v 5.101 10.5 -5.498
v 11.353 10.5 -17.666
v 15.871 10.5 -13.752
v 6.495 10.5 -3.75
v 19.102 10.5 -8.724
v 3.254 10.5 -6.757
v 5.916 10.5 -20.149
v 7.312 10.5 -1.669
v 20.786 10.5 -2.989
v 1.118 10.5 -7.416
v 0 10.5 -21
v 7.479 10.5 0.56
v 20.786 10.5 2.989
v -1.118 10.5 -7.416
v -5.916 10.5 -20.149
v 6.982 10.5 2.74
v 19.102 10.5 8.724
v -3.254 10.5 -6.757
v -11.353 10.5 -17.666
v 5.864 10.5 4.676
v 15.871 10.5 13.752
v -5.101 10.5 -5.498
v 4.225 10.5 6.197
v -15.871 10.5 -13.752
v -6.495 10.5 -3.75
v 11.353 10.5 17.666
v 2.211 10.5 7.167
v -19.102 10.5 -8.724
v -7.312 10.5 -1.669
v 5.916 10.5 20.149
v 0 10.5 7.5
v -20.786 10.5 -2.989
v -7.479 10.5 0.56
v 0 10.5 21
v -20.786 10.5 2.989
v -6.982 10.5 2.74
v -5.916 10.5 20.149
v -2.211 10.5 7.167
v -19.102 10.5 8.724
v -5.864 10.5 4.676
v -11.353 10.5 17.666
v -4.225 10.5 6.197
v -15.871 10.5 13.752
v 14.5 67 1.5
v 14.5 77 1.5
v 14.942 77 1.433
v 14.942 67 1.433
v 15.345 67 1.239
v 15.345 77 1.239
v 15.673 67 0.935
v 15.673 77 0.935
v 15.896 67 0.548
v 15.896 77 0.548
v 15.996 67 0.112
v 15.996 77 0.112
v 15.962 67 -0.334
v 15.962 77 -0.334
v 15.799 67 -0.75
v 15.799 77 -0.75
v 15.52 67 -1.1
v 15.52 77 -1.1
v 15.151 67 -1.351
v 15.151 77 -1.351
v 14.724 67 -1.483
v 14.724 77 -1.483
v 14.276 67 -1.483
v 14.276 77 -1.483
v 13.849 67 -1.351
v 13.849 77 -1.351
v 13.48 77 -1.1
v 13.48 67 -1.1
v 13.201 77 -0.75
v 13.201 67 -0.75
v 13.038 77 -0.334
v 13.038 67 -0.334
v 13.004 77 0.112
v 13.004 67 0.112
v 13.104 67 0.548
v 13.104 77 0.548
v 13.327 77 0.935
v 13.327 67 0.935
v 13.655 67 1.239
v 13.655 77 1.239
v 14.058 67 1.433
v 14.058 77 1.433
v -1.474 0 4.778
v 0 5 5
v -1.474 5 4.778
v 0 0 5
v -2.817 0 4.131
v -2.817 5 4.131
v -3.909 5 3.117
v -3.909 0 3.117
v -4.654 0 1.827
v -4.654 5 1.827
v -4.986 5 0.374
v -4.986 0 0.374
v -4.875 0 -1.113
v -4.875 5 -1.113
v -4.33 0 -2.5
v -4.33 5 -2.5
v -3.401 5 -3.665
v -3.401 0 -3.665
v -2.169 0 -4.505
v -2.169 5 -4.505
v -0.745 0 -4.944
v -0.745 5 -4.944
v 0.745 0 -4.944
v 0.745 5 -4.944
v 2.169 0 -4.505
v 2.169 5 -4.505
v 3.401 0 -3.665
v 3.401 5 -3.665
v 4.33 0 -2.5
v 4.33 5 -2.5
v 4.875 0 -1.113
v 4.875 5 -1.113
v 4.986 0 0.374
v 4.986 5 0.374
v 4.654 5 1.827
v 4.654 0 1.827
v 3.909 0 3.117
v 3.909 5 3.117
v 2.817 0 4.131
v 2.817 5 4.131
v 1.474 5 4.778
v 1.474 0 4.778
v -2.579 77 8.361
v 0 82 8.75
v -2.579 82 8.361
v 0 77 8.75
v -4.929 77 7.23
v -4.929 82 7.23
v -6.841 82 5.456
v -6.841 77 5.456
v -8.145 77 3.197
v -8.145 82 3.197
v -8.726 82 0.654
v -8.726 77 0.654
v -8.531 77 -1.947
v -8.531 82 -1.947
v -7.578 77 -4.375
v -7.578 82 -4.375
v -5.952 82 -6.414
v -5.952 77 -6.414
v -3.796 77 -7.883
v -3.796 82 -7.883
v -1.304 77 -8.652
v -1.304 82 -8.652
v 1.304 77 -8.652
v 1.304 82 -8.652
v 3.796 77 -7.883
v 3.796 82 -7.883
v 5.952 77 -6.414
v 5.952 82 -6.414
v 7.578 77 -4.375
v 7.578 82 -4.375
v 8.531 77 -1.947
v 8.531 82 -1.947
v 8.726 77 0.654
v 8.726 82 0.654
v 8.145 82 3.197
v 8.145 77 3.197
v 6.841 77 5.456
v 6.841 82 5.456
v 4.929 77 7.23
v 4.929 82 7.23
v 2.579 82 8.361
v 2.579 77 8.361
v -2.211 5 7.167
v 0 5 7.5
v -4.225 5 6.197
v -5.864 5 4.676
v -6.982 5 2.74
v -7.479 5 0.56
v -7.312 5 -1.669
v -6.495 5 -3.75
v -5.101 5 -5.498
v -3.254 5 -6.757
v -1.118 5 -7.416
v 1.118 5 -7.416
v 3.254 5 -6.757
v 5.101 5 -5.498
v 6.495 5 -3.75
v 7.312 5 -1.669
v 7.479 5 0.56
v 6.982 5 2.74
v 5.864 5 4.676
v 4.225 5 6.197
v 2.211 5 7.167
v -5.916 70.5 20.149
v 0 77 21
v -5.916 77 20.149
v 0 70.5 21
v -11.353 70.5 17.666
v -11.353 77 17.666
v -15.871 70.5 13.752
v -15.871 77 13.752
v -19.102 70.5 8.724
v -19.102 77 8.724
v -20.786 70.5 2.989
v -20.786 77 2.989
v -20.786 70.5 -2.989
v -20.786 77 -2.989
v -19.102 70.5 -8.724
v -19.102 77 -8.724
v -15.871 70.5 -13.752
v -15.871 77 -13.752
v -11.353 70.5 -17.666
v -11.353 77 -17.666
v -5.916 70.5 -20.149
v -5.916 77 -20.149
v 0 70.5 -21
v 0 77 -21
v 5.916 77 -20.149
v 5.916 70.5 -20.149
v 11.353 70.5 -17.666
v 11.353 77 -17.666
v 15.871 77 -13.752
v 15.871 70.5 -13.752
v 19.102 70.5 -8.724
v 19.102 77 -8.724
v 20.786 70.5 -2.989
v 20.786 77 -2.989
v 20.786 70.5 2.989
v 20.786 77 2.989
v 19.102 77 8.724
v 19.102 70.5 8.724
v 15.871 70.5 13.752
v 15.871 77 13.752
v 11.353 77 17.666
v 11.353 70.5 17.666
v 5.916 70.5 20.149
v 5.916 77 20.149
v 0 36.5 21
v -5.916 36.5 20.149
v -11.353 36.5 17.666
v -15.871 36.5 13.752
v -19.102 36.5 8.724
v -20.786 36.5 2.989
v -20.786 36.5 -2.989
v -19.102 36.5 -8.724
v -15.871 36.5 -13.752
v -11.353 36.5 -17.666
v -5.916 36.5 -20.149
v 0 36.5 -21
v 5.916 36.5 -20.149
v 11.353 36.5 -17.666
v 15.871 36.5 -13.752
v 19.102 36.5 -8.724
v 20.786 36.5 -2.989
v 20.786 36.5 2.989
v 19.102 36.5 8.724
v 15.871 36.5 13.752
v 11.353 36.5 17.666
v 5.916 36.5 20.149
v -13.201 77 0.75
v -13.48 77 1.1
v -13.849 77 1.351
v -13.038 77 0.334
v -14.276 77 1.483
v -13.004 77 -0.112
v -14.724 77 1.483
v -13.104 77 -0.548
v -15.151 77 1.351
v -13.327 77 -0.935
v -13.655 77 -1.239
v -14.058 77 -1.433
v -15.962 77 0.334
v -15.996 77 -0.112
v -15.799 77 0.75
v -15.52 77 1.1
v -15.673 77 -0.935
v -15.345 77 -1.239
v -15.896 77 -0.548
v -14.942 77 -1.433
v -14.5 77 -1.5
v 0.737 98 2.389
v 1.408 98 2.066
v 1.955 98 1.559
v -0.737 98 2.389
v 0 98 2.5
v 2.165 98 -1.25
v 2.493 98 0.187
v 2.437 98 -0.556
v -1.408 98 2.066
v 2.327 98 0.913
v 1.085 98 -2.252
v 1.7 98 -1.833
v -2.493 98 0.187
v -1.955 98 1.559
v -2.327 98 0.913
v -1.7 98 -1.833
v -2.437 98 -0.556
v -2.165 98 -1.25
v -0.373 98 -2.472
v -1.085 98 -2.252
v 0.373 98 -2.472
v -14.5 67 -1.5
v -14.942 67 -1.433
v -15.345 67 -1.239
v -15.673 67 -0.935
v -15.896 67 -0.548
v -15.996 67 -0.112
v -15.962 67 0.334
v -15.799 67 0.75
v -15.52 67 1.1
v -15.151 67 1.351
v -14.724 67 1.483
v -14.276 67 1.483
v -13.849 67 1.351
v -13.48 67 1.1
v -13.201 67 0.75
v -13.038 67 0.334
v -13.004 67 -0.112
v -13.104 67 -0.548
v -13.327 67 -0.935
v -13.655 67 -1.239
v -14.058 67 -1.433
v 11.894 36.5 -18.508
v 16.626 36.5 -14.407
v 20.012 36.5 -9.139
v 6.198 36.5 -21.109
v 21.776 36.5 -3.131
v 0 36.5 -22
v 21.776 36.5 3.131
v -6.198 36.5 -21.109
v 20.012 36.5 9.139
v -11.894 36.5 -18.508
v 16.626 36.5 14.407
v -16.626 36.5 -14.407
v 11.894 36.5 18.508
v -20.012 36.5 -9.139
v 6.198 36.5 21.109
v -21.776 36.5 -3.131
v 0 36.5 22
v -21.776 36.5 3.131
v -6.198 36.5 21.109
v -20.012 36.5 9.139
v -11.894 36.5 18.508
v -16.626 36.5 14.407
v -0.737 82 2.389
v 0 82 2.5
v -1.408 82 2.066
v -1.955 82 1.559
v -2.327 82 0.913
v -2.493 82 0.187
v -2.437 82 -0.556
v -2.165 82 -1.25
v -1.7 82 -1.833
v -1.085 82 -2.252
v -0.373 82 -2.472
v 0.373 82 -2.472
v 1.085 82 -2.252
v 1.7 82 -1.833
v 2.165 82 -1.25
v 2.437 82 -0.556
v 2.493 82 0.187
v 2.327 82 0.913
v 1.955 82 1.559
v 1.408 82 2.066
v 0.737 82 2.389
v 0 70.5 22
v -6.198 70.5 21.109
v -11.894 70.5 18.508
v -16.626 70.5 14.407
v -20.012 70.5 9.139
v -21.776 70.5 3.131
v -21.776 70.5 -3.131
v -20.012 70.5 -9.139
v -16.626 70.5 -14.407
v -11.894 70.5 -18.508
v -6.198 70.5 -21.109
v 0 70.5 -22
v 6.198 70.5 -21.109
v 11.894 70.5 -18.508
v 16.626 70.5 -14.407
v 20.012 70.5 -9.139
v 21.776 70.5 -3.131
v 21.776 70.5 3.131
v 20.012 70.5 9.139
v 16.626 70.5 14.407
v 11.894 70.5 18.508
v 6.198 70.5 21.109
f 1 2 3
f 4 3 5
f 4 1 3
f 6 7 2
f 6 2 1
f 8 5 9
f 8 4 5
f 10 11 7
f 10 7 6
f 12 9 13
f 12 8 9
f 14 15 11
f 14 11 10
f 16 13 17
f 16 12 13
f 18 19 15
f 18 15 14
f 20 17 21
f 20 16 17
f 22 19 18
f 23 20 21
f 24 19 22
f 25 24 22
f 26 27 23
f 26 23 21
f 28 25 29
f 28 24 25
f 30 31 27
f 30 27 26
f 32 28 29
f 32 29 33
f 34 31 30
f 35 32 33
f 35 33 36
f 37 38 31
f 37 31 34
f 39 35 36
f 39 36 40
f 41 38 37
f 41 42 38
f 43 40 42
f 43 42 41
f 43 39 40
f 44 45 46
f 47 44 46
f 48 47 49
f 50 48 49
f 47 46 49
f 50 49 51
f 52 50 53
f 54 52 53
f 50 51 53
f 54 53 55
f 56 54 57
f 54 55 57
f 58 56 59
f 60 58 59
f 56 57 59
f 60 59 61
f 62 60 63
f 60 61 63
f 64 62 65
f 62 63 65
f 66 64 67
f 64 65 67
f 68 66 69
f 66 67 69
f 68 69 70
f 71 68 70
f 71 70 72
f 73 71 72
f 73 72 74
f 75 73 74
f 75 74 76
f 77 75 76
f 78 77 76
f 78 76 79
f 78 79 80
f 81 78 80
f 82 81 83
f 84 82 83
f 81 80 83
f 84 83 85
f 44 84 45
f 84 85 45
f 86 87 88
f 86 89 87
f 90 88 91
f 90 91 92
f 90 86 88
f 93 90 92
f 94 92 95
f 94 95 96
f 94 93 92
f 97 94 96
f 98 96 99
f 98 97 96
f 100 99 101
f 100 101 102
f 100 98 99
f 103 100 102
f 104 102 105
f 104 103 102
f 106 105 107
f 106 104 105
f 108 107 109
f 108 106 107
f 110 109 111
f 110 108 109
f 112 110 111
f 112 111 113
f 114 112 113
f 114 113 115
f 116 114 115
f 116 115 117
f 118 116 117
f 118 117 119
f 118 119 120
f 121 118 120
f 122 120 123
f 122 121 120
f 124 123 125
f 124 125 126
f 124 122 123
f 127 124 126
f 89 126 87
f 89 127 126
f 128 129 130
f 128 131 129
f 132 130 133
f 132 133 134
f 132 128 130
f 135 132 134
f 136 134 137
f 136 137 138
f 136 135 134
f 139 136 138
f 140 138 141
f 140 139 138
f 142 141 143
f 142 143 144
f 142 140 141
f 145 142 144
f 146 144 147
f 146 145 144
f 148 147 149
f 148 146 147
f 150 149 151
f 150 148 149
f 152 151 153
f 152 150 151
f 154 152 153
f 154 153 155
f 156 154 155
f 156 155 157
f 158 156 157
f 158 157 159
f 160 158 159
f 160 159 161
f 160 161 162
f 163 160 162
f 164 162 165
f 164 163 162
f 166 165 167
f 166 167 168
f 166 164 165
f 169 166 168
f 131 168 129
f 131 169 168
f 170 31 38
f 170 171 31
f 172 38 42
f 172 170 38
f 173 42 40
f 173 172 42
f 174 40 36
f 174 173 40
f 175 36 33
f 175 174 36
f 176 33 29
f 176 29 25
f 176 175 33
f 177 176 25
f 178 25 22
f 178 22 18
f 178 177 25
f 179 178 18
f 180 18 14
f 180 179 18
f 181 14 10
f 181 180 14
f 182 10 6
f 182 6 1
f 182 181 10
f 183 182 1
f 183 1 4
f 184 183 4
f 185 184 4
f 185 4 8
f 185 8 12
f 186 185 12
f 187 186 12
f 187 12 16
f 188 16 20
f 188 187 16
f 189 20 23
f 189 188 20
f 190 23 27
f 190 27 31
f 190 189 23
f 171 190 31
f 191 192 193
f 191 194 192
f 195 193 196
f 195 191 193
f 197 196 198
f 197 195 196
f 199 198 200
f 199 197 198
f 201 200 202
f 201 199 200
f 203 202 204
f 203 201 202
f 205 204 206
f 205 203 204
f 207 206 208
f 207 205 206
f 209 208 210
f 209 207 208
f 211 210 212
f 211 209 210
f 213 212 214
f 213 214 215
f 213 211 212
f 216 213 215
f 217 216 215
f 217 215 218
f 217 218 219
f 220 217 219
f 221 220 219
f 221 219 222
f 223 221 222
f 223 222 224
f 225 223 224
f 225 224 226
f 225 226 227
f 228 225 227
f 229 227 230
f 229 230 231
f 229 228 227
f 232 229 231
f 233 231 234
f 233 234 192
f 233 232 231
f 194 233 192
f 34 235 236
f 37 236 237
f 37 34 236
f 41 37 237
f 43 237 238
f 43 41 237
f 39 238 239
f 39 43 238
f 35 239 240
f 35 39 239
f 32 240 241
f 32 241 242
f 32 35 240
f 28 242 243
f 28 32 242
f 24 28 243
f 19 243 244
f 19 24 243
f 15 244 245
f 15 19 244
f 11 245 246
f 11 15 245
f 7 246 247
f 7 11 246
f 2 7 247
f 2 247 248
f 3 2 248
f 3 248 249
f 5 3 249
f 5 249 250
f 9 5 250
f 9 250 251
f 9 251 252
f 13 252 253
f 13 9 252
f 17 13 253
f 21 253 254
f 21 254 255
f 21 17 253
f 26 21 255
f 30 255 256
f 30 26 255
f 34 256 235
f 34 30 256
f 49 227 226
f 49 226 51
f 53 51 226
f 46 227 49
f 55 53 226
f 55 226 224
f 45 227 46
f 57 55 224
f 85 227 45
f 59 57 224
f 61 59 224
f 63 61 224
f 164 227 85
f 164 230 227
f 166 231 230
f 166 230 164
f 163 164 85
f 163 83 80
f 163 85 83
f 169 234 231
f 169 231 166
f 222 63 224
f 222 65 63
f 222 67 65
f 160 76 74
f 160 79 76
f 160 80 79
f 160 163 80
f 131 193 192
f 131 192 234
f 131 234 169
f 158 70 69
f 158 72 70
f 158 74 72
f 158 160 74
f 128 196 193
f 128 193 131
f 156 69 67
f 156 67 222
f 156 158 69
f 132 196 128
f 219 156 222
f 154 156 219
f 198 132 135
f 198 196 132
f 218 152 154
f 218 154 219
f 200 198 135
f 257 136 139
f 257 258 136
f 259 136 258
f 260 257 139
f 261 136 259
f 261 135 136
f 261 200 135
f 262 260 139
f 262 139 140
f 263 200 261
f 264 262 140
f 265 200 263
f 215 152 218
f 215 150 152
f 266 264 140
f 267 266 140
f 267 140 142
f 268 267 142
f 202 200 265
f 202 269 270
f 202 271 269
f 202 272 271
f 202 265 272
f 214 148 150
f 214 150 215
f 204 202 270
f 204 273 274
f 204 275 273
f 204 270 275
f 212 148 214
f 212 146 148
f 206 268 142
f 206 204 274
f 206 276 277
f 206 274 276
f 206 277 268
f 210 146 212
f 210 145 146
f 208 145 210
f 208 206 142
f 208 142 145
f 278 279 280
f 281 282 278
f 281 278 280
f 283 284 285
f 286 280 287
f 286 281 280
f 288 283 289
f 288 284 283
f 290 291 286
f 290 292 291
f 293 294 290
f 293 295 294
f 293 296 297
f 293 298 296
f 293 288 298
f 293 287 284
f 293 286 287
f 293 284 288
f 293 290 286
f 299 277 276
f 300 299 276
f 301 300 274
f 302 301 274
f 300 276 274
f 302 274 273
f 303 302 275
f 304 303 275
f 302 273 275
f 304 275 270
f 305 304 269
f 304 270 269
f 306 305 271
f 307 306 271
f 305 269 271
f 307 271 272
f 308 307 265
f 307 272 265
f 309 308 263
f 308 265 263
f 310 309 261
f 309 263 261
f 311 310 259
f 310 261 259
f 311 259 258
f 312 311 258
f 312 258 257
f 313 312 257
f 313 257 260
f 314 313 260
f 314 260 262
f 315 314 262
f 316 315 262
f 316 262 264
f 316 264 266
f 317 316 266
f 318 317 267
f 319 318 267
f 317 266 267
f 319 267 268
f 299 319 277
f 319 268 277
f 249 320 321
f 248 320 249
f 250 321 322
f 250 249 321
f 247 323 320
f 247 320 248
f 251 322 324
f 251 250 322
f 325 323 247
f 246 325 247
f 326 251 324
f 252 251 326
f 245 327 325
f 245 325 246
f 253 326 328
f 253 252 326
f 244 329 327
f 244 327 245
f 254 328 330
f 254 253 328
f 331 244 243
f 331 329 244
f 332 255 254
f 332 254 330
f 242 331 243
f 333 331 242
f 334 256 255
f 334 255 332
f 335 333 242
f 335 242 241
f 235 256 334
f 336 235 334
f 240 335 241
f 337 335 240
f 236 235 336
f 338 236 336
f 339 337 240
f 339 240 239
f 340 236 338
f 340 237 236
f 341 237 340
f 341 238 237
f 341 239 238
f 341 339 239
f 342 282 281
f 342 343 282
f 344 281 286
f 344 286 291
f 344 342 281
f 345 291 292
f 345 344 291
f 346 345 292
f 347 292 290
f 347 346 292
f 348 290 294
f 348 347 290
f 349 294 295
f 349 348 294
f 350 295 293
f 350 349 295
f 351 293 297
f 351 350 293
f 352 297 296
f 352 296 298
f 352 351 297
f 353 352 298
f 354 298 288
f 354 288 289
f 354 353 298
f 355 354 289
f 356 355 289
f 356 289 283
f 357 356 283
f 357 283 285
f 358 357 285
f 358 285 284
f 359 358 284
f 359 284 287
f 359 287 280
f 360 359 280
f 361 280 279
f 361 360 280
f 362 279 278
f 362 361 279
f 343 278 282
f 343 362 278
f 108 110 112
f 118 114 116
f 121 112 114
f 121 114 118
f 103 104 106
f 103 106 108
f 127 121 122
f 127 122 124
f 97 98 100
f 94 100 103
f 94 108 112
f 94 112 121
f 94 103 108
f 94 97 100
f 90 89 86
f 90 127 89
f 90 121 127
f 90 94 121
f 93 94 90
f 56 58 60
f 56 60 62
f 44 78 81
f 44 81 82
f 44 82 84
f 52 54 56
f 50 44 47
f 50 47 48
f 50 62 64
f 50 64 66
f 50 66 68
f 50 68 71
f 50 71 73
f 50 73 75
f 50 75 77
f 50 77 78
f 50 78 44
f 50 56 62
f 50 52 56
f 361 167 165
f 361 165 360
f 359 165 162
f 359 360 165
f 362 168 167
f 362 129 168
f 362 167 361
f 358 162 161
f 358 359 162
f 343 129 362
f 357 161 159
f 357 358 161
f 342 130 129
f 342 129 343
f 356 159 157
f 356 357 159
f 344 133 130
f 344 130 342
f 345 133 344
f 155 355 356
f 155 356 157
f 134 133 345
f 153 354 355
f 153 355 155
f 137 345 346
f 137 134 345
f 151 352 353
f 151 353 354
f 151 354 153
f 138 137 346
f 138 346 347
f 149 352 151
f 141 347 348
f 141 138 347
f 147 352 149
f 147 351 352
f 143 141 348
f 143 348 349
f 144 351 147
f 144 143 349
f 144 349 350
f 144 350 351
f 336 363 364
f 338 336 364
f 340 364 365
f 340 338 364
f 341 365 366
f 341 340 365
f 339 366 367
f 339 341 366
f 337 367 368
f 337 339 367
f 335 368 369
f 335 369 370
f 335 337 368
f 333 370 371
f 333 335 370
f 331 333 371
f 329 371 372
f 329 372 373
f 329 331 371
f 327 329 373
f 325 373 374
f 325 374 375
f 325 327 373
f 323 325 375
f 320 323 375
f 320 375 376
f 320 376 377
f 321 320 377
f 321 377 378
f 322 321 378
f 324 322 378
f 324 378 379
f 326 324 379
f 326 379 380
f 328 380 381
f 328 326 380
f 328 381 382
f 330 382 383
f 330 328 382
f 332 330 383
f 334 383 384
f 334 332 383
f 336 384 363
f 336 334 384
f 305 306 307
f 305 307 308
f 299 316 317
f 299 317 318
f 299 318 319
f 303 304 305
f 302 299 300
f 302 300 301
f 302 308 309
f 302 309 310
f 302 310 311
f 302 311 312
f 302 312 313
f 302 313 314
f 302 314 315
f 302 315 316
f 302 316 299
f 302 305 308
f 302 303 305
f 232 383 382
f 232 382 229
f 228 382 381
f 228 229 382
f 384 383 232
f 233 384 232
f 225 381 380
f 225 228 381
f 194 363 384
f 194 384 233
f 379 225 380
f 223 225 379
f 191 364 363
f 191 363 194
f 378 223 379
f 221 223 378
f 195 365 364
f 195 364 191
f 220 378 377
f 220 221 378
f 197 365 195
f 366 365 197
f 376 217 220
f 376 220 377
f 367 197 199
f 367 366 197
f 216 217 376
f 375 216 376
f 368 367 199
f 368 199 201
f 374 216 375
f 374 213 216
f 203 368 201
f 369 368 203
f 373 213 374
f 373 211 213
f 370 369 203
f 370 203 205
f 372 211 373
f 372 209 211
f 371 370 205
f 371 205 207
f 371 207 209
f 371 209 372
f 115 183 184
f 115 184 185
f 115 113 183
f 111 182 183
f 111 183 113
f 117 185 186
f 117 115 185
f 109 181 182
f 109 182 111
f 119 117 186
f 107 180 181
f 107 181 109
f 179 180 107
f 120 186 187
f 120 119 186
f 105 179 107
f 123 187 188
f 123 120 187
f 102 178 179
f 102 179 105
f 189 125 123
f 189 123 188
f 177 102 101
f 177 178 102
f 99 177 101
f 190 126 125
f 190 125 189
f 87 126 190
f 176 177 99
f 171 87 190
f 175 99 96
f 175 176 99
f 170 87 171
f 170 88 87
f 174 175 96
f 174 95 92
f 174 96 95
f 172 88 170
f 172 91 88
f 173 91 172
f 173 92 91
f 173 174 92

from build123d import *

# Parameters (mm, degrees)
SKETCH_2_R          = 1.5
CUT_EXTRUDE_1_DEPTH = 10


with BuildPart() as part:
    # 草图1 → 旋转1 (revolve)
    with BuildSketch(Plane.XY, mode=Mode.PRIVATE) as revolve_1_sk:
        Polygon((0, 98), (2.5, 98), (2.5, 82), (8.75, 82), (8.75, 77), (21, 77), (21, 70.5), (22, 70.5), (22, 36.5), (21, 36.5), (21, 10.5), (7.5, 10.5), (7.5, 5), (5, 5), (5, 0), (0, 0), align=None)
    revolve(revolve_1_sk.sketch.rotate(Axis((0, 120.576266676, 0), (0, -1, 0)), 90), axis=Axis((0, 120.576266676, 0), (0, -1, 0)))

    # 草图2 → 切除-拉伸1 (cut)
    with BuildSketch(Plane(origin=(0, 77, 0), x_dir=(1, 0, 0), z_dir=(0, 1, 0))):
        with Locations(Location((14.5, 0, 0), (0, 0, 270))):
            Circle(SKETCH_2_R)
        with Locations(Location((-14.5, 0, 0), (0, 0, 90))):
            Circle(SKETCH_2_R)
    extrude(amount=-CUT_EXTRUDE_1_DEPTH, mode=Mode.SUBTRACT)


solid = part.part
